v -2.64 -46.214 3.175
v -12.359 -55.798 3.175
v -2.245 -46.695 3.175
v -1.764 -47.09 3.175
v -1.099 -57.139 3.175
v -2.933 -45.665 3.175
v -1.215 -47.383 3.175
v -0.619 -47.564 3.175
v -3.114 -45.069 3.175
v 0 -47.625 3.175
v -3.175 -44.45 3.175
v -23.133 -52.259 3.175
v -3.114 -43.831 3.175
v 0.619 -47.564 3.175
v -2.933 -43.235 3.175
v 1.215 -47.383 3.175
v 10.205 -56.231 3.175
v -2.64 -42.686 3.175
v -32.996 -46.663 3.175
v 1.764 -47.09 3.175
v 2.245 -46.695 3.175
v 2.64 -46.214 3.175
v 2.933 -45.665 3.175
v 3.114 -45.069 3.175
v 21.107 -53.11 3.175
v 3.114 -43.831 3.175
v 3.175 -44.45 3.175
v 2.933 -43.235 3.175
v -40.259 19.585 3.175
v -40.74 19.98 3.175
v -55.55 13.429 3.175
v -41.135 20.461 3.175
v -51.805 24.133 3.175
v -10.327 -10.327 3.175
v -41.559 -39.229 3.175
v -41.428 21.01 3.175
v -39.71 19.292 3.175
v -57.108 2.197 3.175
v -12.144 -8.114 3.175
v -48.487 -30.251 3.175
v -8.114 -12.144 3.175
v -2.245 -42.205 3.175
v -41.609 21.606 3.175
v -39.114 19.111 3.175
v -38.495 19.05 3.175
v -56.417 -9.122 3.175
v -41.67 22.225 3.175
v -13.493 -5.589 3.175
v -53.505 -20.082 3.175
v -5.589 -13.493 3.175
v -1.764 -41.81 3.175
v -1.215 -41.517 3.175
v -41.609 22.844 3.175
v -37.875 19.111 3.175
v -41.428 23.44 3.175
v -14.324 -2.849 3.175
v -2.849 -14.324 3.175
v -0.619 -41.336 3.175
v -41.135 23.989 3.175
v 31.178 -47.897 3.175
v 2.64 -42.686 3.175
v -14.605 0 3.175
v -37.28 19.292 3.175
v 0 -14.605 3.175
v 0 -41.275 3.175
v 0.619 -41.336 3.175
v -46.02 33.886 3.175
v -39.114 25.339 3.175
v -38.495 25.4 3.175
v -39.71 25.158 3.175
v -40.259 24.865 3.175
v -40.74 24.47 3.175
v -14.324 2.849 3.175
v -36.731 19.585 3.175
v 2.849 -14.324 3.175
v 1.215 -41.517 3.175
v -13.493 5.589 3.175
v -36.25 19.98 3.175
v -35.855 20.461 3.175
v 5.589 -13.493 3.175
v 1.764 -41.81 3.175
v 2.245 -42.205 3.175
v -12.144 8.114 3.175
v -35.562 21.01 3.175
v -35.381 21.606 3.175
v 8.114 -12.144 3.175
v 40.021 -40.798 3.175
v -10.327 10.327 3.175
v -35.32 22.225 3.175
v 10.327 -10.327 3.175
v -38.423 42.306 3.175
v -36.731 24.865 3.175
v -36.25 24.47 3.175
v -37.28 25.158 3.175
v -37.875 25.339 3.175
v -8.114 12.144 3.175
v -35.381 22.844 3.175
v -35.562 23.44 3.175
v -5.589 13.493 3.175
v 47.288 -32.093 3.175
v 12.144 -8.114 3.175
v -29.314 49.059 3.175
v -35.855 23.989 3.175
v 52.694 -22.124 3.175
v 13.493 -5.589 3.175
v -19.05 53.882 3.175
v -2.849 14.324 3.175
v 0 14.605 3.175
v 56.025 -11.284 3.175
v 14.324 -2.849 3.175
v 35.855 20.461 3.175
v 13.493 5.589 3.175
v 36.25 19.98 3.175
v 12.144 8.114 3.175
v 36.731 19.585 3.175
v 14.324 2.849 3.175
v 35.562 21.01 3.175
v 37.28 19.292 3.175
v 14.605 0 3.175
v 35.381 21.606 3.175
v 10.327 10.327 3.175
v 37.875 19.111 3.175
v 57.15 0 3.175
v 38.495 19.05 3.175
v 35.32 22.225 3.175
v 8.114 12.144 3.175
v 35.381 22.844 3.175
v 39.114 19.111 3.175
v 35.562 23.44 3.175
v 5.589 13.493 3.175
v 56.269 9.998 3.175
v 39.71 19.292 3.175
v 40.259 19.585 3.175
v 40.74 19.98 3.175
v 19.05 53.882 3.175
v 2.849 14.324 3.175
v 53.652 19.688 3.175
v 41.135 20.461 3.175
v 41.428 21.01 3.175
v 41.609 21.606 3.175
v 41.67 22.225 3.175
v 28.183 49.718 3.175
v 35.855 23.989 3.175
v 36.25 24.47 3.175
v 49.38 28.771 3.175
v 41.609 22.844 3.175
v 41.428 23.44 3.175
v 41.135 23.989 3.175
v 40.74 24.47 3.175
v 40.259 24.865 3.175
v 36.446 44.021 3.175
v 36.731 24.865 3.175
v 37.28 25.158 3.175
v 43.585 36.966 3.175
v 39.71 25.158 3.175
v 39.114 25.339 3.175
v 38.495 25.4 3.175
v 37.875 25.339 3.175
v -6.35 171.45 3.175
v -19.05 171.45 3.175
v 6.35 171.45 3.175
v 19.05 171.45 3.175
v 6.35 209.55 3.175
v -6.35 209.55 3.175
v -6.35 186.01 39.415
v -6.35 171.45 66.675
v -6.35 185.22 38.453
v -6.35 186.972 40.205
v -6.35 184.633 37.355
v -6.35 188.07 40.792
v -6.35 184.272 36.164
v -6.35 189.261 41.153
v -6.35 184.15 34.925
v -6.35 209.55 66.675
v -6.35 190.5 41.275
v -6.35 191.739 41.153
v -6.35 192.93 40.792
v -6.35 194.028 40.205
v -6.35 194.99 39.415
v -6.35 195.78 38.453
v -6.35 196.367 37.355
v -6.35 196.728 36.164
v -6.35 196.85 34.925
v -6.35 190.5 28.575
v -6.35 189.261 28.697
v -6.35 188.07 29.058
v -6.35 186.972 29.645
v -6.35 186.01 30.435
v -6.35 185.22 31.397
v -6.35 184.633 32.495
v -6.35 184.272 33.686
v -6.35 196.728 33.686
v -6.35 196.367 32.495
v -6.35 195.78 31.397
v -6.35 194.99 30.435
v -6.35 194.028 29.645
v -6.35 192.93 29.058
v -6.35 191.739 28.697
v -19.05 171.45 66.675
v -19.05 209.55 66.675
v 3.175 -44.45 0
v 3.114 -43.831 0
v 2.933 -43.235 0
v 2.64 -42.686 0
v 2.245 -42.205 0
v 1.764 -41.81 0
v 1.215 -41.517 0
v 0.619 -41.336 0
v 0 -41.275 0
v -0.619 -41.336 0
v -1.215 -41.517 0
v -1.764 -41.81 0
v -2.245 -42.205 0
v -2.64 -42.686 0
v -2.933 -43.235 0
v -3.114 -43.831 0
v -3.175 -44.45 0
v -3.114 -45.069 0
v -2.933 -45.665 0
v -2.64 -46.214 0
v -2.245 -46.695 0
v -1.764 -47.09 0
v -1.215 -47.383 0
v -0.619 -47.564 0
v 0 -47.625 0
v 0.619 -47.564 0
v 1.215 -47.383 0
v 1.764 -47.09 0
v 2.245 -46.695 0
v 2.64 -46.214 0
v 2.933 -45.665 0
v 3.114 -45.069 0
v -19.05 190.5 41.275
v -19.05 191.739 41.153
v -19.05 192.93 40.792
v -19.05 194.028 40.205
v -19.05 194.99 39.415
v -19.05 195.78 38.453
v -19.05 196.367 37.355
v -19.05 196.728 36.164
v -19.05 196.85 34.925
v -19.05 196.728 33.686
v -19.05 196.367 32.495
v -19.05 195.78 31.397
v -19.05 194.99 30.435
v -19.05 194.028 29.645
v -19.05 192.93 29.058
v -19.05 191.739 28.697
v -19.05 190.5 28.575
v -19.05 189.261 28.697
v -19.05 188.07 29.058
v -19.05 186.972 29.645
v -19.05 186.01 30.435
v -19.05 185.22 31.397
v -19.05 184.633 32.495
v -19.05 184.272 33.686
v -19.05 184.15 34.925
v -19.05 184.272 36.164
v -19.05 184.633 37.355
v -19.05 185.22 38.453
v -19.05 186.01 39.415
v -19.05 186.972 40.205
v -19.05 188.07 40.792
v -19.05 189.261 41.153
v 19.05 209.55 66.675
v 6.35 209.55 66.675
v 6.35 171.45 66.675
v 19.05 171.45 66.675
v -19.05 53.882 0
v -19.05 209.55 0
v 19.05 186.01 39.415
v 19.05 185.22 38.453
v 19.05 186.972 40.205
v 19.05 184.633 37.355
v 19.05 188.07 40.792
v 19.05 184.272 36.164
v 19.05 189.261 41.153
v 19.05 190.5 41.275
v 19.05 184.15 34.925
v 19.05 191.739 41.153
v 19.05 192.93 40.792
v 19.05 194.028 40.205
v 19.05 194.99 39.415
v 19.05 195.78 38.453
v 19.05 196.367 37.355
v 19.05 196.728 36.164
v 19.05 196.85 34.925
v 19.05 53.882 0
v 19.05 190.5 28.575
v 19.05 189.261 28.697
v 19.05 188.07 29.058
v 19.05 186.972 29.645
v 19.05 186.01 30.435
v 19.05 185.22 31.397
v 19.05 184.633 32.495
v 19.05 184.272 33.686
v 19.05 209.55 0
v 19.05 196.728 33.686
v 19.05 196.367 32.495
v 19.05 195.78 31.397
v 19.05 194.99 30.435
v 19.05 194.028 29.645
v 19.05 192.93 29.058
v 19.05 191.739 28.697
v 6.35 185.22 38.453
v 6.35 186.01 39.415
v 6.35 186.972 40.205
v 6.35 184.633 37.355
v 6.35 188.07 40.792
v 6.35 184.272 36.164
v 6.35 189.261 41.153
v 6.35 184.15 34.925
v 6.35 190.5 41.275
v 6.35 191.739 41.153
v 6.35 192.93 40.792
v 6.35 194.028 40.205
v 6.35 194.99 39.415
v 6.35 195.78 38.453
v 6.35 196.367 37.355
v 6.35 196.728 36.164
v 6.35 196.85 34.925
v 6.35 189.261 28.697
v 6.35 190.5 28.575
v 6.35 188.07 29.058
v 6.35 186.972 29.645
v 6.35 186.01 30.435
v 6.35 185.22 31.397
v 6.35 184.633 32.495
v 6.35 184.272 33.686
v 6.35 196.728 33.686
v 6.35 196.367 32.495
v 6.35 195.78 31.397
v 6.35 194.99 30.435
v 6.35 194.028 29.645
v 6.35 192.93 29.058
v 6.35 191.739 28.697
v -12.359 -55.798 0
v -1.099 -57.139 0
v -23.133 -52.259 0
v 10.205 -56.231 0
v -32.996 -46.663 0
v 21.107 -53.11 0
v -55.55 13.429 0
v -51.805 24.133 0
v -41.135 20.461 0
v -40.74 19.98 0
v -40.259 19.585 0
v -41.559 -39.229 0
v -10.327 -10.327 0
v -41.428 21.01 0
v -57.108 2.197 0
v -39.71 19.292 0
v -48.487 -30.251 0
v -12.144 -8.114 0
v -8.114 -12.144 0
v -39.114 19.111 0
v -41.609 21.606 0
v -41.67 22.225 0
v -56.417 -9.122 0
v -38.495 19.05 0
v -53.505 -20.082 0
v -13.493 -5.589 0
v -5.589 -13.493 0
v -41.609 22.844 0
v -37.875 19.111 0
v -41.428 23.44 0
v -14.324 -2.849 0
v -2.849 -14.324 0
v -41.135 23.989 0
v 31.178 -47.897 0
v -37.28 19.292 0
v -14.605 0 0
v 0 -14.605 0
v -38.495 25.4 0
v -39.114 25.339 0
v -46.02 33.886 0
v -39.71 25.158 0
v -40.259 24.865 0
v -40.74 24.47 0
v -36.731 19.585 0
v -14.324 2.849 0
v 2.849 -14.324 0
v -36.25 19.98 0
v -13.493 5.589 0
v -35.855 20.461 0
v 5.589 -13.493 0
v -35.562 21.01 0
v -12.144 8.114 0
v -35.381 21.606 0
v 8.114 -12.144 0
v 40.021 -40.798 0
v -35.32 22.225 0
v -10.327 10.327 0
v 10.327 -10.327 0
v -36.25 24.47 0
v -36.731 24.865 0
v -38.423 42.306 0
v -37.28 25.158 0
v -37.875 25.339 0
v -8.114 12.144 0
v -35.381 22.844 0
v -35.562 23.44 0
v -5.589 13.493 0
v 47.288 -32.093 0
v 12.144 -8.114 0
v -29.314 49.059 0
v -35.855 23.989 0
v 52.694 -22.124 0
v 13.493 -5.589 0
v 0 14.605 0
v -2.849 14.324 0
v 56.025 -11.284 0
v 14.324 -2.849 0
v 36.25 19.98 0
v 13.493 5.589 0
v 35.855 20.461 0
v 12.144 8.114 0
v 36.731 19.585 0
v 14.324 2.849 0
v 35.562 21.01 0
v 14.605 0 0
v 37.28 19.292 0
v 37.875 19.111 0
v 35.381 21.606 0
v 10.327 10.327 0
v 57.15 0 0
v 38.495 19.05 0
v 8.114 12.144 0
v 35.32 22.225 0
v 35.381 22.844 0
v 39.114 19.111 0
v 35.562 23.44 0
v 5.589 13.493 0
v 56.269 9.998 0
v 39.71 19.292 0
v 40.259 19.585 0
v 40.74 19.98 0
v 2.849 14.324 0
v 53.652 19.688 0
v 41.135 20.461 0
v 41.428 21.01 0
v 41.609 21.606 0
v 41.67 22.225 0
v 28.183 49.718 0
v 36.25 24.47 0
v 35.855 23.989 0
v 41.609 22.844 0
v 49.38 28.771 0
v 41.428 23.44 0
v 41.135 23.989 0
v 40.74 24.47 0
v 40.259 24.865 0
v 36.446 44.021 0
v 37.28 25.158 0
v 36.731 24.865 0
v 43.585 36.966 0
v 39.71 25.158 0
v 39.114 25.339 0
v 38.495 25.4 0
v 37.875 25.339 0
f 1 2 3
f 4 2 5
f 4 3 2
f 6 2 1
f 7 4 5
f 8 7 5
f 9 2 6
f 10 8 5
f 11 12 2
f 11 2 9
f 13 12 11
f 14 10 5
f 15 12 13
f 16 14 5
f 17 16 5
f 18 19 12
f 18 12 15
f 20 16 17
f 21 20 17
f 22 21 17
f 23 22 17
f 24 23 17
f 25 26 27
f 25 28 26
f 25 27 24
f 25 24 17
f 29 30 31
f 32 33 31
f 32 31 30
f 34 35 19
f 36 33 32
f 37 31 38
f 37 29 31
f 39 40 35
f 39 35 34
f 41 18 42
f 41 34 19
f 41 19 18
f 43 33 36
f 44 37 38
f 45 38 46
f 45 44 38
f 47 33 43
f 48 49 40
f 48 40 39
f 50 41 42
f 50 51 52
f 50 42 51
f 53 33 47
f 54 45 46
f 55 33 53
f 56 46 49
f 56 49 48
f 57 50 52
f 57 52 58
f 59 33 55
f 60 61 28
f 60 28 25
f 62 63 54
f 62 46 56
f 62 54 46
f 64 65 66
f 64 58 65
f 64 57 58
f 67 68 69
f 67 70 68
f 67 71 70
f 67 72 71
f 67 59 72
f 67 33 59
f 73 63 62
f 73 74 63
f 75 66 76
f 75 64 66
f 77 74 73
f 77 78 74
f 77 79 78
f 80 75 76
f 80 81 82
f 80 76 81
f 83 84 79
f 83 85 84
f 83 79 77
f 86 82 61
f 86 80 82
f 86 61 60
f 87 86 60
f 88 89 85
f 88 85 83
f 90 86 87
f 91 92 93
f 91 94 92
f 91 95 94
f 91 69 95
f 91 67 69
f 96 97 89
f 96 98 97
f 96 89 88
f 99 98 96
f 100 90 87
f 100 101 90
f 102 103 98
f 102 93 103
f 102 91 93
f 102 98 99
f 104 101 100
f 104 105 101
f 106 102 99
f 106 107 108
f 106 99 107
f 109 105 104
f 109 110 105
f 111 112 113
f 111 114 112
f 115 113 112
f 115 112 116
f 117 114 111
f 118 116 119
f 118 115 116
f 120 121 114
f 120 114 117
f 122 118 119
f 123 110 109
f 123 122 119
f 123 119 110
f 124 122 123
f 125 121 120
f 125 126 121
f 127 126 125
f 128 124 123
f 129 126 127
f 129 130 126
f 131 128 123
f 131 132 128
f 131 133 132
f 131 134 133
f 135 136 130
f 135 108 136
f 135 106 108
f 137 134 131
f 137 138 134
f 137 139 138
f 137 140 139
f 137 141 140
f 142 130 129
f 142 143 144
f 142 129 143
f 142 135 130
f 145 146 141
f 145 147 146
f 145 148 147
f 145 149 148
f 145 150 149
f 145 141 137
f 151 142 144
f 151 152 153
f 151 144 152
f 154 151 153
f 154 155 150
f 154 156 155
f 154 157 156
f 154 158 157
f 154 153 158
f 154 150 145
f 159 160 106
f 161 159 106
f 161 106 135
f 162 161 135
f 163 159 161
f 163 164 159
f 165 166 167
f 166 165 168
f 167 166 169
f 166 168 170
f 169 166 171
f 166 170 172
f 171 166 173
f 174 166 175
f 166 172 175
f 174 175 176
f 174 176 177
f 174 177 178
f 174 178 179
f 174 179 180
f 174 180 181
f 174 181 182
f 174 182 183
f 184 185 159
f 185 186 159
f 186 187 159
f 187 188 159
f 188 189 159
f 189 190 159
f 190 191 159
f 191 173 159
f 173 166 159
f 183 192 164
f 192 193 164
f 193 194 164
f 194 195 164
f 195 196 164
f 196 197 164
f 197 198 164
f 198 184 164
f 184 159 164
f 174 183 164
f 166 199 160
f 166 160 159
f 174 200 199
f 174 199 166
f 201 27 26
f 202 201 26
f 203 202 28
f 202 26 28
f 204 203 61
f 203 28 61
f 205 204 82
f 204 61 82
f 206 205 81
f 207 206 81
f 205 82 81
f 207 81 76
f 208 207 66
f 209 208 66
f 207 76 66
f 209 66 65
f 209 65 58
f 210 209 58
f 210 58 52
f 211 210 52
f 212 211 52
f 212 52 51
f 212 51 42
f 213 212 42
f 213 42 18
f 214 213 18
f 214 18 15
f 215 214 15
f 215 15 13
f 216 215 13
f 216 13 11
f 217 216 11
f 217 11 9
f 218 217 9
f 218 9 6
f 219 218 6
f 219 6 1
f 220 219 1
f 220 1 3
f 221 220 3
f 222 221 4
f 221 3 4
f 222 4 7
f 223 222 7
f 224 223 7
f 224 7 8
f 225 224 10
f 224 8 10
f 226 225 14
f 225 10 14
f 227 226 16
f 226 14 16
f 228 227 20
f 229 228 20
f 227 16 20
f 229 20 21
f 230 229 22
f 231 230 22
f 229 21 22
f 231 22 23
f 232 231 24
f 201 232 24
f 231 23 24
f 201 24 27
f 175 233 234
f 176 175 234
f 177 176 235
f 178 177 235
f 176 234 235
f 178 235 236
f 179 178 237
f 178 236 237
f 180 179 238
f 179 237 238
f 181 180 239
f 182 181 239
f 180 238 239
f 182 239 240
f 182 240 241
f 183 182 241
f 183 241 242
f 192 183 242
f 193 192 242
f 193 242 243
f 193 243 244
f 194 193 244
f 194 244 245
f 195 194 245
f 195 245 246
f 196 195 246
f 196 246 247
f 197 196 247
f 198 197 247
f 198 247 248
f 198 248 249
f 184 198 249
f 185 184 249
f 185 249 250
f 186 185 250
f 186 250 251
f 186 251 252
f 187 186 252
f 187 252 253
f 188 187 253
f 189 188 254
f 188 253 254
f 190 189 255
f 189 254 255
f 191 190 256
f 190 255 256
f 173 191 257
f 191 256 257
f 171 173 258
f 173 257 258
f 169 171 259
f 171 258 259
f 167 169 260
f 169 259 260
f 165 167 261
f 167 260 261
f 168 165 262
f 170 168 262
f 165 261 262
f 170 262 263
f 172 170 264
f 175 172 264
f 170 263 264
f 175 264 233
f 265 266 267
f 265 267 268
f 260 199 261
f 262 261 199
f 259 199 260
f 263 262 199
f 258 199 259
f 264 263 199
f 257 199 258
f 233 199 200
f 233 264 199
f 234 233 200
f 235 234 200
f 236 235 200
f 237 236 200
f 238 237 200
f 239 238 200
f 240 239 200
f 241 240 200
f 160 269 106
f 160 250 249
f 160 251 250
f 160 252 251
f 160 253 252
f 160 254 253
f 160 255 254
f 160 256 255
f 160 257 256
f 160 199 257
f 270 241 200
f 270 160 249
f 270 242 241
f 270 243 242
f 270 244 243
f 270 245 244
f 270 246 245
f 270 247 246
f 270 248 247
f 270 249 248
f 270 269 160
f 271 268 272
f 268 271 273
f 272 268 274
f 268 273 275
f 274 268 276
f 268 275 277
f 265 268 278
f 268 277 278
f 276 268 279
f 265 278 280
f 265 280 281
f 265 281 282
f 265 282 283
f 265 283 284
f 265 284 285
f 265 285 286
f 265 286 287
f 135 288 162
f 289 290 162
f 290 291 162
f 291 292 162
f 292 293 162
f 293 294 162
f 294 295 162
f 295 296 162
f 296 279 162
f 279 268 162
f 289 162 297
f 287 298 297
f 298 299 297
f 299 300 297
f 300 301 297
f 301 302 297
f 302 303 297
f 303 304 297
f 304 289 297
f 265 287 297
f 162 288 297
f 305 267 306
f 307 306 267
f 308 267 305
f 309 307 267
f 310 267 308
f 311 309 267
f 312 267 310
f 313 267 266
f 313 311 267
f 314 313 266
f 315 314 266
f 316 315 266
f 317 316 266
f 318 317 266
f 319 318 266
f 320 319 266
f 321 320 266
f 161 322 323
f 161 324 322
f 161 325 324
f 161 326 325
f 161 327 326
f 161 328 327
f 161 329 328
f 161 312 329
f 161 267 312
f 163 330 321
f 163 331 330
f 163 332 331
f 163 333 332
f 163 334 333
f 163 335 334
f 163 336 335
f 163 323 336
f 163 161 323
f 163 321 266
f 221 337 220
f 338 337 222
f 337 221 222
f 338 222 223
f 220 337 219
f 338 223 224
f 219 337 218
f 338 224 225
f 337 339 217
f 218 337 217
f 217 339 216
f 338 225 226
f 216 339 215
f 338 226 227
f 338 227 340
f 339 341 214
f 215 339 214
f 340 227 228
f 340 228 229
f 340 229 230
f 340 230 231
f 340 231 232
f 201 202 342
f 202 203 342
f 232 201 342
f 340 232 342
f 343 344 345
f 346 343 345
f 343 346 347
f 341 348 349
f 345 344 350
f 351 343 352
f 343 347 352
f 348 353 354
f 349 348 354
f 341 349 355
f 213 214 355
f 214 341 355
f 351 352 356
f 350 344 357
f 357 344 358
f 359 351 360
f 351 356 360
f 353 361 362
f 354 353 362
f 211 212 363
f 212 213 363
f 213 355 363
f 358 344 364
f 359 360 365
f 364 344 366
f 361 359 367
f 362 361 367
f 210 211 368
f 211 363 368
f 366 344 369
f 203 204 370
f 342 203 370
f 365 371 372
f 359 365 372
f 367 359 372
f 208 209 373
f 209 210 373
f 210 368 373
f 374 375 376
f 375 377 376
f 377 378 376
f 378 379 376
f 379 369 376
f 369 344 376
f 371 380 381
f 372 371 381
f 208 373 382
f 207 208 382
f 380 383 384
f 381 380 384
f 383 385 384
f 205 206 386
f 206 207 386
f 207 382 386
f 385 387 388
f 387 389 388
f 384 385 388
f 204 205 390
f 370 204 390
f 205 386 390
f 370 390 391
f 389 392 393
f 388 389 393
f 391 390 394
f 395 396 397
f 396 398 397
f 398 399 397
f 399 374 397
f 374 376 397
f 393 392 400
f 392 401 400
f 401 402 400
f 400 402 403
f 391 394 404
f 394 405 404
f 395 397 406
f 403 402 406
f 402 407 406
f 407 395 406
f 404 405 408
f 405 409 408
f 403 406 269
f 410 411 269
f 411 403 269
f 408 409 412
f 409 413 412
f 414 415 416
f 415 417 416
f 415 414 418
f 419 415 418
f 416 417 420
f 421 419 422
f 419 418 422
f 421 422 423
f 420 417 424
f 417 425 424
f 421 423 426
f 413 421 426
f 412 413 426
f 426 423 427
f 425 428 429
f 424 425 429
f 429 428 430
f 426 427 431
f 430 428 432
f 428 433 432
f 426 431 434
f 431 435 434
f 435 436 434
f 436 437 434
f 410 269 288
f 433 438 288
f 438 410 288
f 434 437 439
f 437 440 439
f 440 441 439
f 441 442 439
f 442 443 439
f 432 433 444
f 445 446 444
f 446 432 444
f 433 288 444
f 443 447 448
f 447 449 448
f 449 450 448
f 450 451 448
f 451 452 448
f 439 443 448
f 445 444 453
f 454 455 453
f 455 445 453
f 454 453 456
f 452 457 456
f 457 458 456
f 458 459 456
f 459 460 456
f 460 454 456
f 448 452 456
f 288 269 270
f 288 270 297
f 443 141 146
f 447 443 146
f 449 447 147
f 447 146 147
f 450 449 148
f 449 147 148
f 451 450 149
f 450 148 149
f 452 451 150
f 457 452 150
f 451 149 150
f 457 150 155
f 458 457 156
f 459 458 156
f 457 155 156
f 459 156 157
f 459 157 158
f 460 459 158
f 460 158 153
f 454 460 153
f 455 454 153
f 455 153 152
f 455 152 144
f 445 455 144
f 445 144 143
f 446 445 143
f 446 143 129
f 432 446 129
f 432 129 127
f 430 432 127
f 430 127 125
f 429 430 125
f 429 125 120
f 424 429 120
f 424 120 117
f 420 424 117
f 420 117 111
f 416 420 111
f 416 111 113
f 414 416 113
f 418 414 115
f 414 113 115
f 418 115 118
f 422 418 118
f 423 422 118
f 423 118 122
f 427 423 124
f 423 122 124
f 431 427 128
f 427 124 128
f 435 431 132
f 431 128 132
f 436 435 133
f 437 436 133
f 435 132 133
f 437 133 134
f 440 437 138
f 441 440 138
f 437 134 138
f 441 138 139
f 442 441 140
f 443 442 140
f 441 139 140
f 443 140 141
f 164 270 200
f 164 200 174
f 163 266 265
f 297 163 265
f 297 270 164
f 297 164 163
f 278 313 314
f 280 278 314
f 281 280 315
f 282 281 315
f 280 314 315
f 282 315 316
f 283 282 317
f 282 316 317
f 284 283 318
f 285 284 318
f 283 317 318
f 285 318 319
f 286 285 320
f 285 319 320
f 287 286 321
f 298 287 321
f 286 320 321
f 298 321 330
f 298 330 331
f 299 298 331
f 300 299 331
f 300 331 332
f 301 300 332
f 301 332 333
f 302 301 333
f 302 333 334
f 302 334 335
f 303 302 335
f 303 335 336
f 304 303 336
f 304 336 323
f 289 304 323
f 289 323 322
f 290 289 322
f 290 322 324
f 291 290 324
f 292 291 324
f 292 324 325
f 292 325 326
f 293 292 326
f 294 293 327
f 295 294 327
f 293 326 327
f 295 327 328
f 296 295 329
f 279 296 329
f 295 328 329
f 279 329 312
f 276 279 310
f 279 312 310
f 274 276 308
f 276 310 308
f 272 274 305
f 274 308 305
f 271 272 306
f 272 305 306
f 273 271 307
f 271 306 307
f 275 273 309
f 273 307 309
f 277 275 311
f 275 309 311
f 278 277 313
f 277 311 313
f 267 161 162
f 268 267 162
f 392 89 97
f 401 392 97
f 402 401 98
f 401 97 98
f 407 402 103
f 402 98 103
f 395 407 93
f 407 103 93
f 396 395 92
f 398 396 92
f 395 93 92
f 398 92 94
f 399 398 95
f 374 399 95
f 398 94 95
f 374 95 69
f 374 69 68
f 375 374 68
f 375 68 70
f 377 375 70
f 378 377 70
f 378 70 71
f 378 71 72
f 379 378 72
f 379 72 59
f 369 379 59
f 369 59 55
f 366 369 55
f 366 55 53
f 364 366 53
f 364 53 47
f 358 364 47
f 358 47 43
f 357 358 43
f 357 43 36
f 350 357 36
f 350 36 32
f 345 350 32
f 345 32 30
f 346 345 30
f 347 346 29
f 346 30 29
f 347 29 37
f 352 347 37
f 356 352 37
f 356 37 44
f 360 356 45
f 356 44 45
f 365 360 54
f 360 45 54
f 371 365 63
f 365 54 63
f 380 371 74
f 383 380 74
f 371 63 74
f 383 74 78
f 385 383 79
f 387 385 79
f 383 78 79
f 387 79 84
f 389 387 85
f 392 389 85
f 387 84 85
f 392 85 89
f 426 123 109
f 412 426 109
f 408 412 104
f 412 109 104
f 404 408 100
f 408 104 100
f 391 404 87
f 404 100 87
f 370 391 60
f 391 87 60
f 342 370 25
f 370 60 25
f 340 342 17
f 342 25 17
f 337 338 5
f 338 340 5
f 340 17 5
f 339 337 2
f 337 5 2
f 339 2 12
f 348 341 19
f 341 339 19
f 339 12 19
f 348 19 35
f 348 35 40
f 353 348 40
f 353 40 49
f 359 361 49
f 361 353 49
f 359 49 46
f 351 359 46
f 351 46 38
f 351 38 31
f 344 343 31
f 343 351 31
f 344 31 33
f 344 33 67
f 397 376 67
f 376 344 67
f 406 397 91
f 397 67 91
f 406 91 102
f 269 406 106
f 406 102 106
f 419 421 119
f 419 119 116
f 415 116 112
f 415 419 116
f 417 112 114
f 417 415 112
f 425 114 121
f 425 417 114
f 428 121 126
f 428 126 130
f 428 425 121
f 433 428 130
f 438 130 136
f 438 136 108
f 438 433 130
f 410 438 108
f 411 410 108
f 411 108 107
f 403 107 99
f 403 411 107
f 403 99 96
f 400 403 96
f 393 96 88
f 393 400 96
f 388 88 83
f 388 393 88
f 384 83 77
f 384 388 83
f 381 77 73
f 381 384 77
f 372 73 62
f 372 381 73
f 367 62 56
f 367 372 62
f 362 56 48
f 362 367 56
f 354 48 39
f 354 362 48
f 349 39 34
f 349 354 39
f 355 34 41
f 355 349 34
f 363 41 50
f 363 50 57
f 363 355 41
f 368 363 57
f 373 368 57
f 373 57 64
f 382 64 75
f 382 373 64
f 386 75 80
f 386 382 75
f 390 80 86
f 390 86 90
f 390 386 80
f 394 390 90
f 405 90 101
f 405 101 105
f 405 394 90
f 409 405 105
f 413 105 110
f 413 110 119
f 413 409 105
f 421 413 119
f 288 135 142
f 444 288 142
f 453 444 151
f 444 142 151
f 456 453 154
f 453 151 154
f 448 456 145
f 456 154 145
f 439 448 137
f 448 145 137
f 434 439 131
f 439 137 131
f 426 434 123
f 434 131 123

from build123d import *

# Parameters (mm, degrees)
SKETCH1_R           = 14.605
BOSS_EXTRUDE1_DEPTH = 3.175
SKETCH2_R           = 3.175
CUT_EXTRUDE1_DEPTH  = 228.649935482
SKETCH2_3_W         = 12.7
SKETCH2_3_H         = 38.1
BOSS_EXTRUDE2_DEPTH = 63.5
SKETCH3_R           = 6.35
CUT_EXTRUDE2_DEPTH  = 245.969305475
CUT_EXTRUDE3_DEPTH  = 237.318984637


with BuildPart() as part:
    # Sketch1 → Boss-Extrude1 (new body)
    with BuildSketch(Plane.XY):
        Polygon((-19.05, 88.9), (-88.9, 88.9), (-88.9, -88.9), (88.9, -88.9), (88.9, 88.9), (19.05, 88.9), (19.05, 209.55), (-19.05, 209.55), align=None)
        Circle(SKETCH1_R, mode=Mode.SUBTRACT)
    extrude(amount=BOSS_EXTRUDE1_DEPTH)

    # Sketch2 → Cut-Extrude1 (cut, through all)
    with BuildSketch(Plane.XY.offset(3.175)):
        with Locations((-38.494829198, 22.225)):
            Circle(SKETCH2_R)
        with Locations((0, -44.45)):
            Circle(SKETCH2_R)
        with Locations((38.494829198, 22.225)):
            Circle(SKETCH2_R)
    extrude(amount=-CUT_EXTRUDE1_DEPTH, mode=Mode.SUBTRACT)

    # Sketch2<3> → Boss-Extrude2 (add)
    with BuildSketch(Plane.XY.offset(3.175)):
        with Locations((-12.7, 190.5)):
            Rectangle(SKETCH2_3_W, SKETCH2_3_H)
        with Locations((12.7, 190.5)):
            Rectangle(SKETCH2_3_W, SKETCH2_3_H)
    extrude(amount=BOSS_EXTRUDE2_DEPTH)

    # Sketch3 → Cut-Extrude2 (cut, through all)
    with BuildSketch(Plane.ZY.offset(19.05)):
        with Locations((34.925, 190.5)):
            Circle(SKETCH3_R)
    extrude(amount=-CUT_EXTRUDE2_DEPTH, mode=Mode.SUBTRACT)

    # Sketch4 → Cut-Extrude3 (cut, through all)
    with BuildSketch(Plane.XY.offset(3.175)):
        with BuildLine():
            Line((-19.05, 53.881536726), (-19.05, 88.9))
            Line((-19.05, 88.9), (-88.9, 88.9))
            Line((-88.9, 88.9), (-88.9, -88.9))
            Line((-88.9, -88.9), (88.9, -88.9))
            Line((88.9, -88.9), (88.9, 88.9))
            Line((88.9, 88.9), (19.05, 88.9))
            Line((19.05, 88.9), (19.05, 53.881536726))
            ThreePointArc((19.05, 53.881536726), (46.6627796, 32.995567884), (57.15, 0))
            ThreePointArc((57.15, 0), (-32.995567884, -46.6627796), (-19.05, 53.881536726))
        make_face()
    extrude(amount=-CUT_EXTRUDE3_DEPTH, mode=Mode.SUBTRACT)


solid = part.part
